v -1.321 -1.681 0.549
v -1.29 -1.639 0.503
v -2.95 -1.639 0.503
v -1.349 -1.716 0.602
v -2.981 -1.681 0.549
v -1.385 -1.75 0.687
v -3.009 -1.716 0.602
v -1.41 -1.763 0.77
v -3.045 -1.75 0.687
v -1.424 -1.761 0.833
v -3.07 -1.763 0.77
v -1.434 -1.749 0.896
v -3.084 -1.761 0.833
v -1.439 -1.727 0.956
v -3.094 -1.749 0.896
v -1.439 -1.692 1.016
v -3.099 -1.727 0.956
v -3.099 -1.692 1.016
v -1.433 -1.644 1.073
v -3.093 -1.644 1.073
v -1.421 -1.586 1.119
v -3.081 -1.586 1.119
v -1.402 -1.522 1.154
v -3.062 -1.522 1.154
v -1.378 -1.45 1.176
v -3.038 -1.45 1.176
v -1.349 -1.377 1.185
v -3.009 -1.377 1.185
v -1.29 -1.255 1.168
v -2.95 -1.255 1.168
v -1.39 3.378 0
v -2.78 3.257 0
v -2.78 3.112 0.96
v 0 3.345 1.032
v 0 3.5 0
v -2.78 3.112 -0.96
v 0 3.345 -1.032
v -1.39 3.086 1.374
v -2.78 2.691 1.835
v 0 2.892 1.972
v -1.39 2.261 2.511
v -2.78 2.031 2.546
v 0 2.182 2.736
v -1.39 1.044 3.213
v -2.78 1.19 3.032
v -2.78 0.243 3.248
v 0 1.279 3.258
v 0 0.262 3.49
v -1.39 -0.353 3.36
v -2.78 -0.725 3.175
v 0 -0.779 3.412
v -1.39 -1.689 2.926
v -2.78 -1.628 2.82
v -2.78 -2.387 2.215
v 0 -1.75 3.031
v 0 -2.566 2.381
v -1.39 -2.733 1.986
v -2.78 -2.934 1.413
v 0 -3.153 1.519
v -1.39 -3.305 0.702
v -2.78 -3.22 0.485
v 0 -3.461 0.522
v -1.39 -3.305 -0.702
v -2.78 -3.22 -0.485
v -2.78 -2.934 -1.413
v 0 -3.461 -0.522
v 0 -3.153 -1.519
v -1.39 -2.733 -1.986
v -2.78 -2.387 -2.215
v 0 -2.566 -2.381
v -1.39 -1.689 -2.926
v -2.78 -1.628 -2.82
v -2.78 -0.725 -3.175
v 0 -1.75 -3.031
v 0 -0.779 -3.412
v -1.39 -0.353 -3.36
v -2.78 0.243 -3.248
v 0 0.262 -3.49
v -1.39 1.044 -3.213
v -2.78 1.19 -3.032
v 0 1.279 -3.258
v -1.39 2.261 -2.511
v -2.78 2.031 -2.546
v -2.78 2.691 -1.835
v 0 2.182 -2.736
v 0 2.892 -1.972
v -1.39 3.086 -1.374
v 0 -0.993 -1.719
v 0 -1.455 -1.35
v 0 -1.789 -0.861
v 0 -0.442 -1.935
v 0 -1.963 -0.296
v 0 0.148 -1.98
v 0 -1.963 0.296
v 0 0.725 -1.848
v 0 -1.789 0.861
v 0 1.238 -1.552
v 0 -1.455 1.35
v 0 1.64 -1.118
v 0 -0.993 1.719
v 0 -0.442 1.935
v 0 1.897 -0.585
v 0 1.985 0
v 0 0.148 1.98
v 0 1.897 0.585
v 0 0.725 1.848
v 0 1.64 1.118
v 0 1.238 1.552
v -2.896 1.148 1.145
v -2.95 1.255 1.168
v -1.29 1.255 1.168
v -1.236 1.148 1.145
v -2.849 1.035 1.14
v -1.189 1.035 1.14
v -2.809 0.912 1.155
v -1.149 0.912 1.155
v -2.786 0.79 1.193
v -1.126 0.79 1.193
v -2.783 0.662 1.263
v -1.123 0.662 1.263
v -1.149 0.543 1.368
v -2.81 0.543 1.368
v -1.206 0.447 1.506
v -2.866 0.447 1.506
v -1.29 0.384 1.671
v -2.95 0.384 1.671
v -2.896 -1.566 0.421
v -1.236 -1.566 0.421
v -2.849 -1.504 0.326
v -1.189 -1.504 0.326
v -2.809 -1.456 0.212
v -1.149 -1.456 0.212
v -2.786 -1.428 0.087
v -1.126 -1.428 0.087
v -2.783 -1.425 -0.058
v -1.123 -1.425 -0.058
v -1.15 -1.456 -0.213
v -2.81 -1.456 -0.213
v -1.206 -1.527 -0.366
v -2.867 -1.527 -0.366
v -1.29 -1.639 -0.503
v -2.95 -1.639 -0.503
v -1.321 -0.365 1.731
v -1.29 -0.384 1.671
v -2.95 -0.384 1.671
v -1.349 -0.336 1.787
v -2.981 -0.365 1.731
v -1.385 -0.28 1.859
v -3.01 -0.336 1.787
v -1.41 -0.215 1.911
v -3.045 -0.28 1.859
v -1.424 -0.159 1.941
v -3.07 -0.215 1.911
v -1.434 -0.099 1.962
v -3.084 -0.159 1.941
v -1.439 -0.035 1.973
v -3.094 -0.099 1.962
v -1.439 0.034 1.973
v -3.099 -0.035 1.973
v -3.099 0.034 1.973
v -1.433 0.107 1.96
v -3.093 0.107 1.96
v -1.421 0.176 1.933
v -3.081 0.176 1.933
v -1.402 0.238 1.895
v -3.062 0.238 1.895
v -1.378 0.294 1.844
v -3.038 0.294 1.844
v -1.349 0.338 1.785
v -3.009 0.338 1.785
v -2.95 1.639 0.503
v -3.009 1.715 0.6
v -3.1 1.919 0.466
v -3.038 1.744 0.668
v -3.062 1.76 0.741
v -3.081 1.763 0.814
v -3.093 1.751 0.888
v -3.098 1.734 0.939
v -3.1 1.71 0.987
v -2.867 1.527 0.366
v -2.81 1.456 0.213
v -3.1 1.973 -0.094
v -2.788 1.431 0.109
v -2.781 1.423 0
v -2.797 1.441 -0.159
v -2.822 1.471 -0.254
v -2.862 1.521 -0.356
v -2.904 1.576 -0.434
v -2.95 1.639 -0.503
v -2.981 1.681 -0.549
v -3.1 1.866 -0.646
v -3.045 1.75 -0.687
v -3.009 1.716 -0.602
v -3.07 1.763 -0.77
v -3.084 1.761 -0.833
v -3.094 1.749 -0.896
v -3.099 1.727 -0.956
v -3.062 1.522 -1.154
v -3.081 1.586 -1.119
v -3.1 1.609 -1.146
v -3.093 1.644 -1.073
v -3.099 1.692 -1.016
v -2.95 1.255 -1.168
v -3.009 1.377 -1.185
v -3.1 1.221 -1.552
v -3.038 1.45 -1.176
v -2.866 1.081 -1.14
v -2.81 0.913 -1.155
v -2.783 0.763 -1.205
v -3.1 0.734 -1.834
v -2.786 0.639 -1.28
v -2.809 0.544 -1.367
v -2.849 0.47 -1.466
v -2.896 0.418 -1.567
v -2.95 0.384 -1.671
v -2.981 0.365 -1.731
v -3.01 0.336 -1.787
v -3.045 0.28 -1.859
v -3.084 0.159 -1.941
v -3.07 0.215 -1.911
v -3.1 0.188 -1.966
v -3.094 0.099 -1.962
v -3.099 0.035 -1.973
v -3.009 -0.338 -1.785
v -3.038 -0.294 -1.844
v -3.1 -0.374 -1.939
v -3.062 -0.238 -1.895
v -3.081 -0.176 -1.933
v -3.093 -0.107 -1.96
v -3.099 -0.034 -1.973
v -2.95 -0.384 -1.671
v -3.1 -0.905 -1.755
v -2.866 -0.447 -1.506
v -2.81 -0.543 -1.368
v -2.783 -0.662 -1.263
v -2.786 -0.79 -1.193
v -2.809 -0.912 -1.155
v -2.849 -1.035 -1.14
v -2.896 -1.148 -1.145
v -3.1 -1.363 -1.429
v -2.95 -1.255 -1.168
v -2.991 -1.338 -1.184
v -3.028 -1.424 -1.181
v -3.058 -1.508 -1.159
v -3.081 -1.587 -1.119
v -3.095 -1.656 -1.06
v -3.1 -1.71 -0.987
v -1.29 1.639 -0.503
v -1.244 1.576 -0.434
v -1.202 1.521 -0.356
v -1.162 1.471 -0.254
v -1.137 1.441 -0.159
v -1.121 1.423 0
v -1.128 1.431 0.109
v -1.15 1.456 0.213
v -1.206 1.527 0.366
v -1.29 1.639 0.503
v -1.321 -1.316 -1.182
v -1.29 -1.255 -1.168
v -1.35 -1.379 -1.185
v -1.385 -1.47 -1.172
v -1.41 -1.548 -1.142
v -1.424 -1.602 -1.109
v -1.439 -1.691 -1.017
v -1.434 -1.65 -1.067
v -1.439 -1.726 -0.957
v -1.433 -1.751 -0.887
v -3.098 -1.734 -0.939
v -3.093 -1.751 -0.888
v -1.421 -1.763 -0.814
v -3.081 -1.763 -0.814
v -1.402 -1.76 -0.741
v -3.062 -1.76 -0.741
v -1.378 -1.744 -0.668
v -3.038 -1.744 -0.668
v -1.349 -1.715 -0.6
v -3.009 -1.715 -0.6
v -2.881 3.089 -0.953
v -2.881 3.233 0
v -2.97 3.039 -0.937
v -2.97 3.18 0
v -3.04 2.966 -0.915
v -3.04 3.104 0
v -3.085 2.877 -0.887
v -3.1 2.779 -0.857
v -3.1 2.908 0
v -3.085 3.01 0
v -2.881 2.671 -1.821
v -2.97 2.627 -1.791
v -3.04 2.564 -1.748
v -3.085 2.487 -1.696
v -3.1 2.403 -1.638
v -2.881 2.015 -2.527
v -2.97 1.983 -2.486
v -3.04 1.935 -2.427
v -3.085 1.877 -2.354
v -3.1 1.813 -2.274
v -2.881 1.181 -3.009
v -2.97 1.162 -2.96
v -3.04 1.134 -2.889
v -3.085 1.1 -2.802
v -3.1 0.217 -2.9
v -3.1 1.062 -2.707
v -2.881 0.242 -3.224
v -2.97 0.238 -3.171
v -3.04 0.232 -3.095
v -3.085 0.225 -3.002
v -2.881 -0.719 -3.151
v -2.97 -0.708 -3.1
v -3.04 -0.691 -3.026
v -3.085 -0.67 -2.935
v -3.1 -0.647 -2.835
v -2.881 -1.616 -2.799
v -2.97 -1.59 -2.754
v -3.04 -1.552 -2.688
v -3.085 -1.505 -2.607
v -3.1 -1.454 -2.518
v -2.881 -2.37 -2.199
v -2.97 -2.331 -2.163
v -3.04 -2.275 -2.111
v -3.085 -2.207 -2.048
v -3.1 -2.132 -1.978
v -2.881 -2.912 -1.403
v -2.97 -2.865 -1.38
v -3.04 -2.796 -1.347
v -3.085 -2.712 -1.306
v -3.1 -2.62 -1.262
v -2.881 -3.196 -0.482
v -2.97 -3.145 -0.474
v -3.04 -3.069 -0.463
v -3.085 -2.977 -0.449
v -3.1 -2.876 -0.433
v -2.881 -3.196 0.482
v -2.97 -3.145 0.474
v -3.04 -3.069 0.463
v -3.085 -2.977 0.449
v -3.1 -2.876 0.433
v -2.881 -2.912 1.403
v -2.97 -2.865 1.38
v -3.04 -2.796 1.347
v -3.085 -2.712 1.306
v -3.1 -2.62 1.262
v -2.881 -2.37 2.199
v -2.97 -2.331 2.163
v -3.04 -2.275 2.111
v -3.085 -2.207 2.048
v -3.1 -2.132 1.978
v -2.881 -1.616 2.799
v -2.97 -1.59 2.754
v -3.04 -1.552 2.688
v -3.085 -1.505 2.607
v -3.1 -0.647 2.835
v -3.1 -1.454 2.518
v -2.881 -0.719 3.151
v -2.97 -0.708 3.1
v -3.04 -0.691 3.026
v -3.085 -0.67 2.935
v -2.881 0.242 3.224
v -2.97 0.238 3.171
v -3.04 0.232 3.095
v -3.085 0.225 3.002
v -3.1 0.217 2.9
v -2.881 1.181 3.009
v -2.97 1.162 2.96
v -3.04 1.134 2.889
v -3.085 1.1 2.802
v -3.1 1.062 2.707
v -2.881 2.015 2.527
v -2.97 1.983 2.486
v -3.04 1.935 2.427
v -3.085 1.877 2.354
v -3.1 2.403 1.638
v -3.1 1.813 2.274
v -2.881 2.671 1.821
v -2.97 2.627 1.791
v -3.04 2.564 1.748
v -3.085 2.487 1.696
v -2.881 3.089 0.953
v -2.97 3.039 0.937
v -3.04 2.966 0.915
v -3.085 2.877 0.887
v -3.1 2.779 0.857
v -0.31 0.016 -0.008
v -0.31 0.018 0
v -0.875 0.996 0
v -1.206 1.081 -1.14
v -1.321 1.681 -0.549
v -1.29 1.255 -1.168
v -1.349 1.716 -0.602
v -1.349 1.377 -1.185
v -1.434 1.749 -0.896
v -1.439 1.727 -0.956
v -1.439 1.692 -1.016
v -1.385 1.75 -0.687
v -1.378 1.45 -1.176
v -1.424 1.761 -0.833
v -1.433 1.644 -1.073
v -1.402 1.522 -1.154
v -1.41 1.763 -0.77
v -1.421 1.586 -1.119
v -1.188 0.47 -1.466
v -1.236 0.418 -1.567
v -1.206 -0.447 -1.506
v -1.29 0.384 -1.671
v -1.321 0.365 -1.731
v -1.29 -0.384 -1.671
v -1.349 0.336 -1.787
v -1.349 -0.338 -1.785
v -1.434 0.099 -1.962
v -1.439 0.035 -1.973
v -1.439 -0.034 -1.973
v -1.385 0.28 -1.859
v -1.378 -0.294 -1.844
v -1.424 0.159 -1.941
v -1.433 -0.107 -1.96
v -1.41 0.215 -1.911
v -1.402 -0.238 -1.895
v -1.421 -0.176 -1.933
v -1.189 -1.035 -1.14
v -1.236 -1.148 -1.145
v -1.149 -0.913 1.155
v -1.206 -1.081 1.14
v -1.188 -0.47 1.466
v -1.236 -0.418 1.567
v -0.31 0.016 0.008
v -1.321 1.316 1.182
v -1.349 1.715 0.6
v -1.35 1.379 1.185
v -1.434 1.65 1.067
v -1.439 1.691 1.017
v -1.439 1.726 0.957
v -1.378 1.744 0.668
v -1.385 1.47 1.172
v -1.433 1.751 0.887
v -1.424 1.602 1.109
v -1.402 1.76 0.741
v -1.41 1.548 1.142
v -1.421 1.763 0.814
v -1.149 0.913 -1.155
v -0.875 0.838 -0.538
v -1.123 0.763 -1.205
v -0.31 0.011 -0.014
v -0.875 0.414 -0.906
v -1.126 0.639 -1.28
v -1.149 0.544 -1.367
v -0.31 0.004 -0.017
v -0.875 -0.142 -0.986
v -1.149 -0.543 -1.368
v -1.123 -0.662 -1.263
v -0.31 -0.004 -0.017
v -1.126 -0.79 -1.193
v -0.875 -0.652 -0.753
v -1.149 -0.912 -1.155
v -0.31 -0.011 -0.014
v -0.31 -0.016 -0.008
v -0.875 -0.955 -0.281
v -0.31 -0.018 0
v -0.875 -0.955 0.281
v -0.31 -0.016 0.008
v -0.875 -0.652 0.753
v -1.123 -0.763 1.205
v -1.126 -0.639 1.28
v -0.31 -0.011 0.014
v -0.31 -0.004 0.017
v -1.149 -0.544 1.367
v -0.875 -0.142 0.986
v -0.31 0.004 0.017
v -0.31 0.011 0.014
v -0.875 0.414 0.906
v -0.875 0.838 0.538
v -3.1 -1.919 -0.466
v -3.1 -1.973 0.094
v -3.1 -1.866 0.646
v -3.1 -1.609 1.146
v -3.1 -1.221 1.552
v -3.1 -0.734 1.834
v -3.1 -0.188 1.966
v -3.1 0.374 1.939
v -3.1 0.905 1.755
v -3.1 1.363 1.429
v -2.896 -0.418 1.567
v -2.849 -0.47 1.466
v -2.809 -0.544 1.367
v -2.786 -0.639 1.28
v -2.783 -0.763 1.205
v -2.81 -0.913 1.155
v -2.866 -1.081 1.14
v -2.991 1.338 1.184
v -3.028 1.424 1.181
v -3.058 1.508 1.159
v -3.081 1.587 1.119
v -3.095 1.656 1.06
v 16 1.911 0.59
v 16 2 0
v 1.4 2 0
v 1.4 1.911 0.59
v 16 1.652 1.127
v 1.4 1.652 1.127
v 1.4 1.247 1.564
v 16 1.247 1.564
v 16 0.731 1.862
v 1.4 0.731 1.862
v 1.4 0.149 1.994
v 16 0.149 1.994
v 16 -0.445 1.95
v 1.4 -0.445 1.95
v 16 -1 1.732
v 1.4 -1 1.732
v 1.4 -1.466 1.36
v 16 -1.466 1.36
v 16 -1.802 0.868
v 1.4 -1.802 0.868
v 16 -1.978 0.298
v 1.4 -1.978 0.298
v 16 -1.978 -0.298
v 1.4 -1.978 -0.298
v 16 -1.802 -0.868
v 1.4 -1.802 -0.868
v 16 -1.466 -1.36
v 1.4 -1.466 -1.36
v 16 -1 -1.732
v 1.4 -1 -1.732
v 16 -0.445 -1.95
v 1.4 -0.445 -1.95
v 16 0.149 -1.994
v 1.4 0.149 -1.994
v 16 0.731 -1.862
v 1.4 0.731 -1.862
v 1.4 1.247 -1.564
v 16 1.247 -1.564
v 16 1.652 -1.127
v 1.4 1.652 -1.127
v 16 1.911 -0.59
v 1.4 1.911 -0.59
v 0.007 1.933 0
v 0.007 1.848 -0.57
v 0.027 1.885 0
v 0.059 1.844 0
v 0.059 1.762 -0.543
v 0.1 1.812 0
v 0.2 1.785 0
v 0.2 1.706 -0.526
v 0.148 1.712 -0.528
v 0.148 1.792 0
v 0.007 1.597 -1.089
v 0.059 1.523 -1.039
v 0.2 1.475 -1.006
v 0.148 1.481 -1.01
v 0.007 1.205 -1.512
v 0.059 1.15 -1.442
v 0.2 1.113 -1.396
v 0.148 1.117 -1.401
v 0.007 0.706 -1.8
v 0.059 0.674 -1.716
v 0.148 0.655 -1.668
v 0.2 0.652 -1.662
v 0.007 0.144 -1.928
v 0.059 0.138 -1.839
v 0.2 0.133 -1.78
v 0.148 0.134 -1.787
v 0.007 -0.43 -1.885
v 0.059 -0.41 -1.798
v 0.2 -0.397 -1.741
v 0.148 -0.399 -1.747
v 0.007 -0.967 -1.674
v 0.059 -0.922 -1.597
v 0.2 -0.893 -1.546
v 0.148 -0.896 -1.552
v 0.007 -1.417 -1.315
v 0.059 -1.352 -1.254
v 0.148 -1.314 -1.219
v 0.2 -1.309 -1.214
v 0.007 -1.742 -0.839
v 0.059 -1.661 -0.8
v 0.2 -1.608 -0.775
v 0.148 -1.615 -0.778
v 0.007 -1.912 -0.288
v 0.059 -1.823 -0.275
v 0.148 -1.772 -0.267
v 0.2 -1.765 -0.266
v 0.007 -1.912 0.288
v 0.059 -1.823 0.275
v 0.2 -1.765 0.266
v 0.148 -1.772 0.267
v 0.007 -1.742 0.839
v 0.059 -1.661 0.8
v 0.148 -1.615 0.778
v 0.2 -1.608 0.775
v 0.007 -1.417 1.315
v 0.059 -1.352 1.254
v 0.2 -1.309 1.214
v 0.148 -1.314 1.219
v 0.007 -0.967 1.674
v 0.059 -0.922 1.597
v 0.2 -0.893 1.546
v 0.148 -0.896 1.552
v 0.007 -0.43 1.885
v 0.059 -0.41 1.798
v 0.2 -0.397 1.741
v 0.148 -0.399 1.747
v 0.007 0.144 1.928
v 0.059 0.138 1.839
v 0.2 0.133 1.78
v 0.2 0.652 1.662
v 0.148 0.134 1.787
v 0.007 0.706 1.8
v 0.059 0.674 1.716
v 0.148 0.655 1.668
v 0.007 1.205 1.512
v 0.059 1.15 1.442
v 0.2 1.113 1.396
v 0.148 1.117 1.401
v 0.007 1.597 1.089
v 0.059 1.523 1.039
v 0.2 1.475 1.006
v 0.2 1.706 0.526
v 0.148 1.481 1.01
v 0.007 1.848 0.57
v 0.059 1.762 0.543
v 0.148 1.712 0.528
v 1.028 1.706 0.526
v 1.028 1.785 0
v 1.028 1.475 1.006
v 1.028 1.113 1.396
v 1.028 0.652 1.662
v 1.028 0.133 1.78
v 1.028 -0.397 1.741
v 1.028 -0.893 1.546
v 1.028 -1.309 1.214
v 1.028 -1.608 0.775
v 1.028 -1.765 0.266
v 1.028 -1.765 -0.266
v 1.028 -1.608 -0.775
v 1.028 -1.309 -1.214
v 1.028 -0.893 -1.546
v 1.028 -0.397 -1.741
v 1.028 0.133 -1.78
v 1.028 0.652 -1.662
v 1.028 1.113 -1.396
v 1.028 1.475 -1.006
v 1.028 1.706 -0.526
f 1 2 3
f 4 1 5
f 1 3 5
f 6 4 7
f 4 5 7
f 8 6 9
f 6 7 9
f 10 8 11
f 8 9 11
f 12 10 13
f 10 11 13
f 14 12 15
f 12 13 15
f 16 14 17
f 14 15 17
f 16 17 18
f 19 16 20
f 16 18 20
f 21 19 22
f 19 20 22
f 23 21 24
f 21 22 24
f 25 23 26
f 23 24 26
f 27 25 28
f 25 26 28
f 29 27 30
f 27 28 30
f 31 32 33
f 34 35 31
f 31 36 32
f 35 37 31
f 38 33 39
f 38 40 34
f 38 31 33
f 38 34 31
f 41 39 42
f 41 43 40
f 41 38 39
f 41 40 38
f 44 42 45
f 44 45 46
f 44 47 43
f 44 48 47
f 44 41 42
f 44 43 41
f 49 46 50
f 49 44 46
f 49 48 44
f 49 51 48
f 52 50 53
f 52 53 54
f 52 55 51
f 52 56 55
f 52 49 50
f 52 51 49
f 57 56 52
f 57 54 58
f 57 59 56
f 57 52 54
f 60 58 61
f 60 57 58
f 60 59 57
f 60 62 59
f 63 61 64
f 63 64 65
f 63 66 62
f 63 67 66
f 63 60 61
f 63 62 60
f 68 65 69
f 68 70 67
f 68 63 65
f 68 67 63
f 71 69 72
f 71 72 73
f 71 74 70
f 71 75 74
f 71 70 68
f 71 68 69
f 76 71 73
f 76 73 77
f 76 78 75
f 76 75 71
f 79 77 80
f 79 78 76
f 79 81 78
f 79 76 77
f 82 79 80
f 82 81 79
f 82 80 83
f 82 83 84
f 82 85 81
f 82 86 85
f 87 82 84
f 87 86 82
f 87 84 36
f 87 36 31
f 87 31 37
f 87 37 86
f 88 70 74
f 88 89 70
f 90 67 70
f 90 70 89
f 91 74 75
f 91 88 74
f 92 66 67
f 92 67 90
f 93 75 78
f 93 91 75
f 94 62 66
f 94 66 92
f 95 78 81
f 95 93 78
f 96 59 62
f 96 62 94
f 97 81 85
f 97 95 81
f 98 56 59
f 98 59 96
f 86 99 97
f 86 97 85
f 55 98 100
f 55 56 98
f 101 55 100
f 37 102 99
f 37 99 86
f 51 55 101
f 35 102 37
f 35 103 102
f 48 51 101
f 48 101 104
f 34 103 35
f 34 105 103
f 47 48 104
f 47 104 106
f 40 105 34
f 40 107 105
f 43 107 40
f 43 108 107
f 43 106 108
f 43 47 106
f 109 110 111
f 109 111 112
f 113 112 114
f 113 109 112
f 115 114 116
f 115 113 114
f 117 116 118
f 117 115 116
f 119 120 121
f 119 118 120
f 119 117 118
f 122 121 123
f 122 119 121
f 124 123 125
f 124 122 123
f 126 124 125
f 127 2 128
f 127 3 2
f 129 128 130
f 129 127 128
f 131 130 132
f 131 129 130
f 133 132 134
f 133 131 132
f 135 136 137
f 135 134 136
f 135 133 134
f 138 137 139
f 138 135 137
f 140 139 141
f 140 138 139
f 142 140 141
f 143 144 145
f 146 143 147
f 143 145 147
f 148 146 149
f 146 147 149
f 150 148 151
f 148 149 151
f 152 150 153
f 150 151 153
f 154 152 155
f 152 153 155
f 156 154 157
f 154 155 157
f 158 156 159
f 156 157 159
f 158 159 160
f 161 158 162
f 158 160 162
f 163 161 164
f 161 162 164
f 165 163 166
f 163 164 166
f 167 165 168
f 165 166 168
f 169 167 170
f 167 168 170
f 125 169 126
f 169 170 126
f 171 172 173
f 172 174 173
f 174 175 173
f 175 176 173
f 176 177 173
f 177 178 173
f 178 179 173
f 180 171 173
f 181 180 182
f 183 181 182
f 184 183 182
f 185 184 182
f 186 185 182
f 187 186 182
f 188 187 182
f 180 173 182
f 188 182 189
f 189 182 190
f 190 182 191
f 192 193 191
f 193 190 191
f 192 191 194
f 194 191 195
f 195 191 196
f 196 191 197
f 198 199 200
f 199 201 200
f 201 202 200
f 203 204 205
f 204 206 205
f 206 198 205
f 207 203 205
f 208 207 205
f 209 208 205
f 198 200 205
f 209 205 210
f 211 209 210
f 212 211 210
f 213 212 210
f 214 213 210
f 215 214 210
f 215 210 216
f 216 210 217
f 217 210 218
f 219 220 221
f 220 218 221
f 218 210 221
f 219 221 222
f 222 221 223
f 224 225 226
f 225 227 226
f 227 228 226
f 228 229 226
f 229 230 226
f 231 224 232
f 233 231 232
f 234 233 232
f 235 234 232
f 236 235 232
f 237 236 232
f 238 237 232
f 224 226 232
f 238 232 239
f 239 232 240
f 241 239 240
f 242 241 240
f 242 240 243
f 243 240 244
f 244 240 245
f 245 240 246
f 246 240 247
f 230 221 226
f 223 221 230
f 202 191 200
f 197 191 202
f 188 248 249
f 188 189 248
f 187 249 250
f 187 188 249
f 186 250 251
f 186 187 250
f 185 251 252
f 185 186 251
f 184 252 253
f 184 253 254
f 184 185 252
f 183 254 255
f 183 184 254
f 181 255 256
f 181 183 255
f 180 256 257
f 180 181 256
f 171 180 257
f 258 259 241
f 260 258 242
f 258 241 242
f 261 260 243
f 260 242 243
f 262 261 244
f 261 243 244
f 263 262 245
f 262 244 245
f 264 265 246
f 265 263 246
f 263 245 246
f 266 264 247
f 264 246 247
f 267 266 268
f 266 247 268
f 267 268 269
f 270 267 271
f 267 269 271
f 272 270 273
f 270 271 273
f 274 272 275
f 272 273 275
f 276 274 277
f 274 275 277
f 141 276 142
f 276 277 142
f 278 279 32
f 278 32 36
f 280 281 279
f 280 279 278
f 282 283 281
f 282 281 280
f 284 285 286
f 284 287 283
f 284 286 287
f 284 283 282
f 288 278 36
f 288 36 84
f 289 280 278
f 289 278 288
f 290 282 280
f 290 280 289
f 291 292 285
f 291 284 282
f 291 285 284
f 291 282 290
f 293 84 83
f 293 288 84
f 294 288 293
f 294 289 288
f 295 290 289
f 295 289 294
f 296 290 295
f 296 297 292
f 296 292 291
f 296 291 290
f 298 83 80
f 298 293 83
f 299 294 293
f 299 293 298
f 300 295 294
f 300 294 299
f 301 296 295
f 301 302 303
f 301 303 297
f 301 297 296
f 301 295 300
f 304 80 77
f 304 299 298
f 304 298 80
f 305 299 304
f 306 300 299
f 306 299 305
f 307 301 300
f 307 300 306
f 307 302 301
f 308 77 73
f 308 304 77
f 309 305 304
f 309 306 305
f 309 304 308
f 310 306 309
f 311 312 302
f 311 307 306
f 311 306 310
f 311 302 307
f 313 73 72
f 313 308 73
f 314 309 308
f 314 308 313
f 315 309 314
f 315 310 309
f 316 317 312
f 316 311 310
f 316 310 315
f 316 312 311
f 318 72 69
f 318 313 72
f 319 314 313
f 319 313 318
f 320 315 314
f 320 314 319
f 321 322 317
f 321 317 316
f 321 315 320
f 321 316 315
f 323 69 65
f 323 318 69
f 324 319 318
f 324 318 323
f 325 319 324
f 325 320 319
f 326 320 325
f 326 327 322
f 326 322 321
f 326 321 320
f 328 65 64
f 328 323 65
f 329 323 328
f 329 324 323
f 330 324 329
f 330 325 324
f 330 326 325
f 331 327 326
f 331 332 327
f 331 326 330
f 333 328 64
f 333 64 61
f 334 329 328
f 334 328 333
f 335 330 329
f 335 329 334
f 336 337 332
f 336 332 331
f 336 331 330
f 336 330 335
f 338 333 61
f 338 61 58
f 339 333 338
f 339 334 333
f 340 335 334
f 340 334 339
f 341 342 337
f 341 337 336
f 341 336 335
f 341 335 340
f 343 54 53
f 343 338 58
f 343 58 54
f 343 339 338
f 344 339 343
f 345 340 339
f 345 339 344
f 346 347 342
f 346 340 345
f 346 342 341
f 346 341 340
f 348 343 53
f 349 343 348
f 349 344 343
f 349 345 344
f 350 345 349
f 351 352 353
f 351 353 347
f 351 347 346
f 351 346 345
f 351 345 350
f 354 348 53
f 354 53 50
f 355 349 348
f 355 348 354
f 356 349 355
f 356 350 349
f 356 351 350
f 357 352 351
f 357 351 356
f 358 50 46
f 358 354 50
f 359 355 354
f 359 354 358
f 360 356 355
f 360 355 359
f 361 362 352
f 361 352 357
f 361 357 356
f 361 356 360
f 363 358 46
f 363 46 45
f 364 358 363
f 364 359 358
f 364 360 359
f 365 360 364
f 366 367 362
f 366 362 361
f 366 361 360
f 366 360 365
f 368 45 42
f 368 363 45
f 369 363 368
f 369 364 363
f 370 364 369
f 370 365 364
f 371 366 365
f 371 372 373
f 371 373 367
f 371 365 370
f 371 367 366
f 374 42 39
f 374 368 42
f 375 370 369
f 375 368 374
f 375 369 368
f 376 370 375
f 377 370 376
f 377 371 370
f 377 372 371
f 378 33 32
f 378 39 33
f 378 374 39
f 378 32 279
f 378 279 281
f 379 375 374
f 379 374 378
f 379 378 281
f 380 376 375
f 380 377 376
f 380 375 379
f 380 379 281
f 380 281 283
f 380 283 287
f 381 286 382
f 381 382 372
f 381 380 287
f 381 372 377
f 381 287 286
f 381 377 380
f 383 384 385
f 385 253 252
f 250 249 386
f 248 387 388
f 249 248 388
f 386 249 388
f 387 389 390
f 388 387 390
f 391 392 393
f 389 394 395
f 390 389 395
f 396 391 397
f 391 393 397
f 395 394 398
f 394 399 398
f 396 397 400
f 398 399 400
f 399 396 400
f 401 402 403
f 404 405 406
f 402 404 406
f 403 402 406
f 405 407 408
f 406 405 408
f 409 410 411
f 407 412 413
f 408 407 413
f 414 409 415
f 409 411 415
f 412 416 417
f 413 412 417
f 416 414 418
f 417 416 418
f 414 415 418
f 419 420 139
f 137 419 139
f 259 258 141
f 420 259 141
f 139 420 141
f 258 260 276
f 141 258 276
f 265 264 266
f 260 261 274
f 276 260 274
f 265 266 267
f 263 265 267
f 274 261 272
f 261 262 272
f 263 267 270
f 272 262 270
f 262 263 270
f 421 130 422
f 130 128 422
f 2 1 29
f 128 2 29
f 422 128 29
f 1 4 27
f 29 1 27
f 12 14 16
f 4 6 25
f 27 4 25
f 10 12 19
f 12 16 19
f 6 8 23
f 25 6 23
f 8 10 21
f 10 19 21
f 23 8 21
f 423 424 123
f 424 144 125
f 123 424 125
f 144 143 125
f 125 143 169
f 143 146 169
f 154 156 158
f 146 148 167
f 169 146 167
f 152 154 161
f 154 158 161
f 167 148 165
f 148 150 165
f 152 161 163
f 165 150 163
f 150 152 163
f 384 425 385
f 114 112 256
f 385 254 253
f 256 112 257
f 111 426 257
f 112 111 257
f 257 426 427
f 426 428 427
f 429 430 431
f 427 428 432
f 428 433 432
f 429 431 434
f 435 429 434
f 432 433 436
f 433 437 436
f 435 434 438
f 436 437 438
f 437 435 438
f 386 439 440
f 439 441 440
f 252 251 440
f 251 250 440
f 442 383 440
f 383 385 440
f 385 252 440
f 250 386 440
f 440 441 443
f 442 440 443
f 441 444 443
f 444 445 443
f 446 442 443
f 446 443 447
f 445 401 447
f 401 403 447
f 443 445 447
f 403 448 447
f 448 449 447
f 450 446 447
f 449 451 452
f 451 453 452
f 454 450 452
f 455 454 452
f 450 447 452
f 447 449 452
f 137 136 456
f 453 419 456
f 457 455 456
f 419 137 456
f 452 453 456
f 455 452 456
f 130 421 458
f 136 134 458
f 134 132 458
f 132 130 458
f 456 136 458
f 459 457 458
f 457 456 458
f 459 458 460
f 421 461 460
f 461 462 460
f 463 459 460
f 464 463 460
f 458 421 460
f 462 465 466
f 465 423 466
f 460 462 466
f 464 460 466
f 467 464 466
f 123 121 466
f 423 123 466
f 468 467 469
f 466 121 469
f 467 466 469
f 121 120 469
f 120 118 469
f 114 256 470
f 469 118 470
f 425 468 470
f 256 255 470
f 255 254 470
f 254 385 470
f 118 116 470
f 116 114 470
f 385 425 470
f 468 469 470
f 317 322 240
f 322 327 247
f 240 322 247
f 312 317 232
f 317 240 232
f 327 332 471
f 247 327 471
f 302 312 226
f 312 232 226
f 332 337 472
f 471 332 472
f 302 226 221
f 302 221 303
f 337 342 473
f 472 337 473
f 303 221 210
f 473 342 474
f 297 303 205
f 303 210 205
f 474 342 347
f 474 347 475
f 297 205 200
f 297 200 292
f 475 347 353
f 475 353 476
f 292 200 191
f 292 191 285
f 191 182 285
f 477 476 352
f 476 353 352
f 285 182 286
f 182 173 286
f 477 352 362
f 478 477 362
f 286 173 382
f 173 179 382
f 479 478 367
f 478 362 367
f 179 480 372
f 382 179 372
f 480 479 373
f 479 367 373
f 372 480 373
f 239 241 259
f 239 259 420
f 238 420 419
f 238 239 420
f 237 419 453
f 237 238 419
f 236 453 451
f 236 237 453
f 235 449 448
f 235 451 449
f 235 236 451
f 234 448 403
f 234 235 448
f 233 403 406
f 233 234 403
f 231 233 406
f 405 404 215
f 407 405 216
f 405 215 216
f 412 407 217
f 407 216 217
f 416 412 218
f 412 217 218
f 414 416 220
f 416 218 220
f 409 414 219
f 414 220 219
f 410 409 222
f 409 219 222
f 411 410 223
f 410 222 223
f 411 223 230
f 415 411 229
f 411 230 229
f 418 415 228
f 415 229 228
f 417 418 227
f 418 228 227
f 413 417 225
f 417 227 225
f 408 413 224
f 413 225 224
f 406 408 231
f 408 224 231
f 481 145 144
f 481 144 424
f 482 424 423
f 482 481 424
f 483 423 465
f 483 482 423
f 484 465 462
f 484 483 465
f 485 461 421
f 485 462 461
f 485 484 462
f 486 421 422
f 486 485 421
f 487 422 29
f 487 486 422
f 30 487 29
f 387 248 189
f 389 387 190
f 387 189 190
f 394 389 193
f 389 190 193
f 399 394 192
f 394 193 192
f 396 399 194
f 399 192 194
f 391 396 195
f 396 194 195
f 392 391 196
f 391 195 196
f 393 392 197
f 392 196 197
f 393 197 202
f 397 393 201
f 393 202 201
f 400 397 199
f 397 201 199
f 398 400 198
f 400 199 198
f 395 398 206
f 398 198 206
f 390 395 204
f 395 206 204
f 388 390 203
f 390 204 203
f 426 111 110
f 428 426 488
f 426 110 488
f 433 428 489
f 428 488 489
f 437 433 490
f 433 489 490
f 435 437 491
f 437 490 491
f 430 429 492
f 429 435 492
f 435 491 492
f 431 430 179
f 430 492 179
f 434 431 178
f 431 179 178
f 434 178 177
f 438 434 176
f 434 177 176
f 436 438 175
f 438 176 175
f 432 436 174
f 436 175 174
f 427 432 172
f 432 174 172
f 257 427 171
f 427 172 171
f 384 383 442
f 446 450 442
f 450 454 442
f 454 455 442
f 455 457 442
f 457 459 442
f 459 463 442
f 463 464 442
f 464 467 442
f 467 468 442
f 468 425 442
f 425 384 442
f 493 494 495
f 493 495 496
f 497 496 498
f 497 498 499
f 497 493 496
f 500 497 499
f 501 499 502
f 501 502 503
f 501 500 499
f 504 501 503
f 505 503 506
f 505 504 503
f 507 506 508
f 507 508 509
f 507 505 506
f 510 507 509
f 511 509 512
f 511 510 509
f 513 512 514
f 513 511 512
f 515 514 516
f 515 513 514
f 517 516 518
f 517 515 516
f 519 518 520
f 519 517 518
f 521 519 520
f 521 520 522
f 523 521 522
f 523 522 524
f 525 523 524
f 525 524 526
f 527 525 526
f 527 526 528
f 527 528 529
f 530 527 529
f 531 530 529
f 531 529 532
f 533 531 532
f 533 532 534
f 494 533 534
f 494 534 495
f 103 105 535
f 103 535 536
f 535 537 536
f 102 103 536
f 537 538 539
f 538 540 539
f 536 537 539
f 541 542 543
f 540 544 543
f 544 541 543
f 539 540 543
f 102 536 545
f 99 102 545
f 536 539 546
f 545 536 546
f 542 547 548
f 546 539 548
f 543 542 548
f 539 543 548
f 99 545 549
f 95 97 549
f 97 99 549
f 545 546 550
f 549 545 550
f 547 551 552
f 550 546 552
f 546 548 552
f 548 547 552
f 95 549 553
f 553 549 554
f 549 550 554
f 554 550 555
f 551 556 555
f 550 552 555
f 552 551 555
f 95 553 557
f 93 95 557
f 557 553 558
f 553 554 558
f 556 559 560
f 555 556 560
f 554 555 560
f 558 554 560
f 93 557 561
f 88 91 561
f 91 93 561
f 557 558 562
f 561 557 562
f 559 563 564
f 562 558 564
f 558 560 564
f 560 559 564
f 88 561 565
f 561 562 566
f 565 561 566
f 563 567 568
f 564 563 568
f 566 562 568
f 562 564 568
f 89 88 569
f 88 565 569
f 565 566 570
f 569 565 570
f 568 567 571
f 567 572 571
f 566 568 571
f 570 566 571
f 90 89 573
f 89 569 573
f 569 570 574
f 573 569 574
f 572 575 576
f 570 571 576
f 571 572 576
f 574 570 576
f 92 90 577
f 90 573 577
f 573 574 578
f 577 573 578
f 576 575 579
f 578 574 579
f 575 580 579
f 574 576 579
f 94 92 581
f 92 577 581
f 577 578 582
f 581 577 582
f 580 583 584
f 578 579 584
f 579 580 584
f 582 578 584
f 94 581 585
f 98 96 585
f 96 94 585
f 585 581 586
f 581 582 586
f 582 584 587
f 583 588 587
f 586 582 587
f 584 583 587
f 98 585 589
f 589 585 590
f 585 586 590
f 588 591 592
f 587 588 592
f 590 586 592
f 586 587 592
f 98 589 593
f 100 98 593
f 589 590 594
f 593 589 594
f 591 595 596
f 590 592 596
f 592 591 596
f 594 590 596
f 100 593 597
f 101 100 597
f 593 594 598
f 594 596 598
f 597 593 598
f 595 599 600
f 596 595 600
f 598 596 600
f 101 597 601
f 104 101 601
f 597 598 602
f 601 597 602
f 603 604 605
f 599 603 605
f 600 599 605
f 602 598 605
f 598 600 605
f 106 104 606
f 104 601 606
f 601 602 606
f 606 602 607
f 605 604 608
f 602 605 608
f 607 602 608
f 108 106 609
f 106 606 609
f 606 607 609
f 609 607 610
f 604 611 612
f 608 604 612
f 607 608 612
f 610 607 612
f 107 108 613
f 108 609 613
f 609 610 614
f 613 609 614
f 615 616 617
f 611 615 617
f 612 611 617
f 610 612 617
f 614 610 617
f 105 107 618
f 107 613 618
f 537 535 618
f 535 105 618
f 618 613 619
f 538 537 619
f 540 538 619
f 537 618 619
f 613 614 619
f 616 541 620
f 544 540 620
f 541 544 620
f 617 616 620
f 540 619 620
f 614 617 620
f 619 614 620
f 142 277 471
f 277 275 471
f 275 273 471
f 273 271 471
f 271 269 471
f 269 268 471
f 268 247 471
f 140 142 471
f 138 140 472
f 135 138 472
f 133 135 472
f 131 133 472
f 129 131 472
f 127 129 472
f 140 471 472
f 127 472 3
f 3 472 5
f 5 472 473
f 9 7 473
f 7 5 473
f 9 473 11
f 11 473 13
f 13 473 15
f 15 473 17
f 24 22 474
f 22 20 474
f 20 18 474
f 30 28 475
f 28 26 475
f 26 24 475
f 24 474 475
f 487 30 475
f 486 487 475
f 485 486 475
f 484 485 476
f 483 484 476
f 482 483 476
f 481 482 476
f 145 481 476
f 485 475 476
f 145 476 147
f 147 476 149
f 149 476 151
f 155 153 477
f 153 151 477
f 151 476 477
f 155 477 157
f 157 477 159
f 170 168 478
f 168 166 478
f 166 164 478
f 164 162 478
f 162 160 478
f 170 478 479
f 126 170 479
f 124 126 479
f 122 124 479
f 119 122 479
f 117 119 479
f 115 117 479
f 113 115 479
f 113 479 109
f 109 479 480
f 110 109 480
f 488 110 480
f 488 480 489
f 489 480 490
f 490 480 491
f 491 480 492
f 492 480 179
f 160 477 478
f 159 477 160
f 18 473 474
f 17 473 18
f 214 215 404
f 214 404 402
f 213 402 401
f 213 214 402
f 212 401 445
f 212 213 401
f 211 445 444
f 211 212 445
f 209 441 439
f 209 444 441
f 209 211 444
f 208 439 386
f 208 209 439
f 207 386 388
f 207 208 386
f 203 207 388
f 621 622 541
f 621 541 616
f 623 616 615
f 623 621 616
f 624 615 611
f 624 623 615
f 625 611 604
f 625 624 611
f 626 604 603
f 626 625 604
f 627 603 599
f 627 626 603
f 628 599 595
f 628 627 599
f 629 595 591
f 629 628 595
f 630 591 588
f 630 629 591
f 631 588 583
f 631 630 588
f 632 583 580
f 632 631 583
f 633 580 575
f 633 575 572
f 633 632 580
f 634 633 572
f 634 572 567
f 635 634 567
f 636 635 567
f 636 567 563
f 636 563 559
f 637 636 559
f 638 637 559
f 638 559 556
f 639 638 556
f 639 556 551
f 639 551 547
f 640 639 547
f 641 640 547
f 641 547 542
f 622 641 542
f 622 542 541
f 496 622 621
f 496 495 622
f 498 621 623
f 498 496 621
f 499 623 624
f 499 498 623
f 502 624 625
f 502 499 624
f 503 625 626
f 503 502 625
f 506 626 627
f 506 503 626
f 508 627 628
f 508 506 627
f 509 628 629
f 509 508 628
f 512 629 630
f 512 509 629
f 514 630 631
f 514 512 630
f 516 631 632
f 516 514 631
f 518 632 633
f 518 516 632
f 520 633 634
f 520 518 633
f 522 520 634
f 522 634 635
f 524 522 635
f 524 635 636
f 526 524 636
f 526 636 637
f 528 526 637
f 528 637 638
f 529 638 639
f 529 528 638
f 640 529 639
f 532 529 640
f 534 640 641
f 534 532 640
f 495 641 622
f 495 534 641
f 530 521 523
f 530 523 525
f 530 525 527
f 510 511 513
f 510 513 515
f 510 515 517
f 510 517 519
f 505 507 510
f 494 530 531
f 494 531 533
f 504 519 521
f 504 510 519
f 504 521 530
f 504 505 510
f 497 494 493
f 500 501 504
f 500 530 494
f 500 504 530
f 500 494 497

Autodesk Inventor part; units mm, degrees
sketch "Skizze_2" plane through (-3.1, 0, 0) normal (1, 0, 0) x (0, 0, -1)
  arc A0 (-1.6711, 0.3843) -> (-1.6711, -0.3843) centre (-1.58, 0) ccw
  arc A1 (-1.1684, -1.2551) -> (-1.6711, -0.3843) centre (-1.8307, -1.0569) ccw
  arc A2 (-1.1684, -1.2551) -> (-0.5027, -1.6394) centre (-0.79, -1.3683) ccw
  arc A3 (0.5027, -1.6394) -> (-0.5027, -1.6394) centre (0, -2.1139) ccw
  arc A4 (0.5027, -1.6394) -> (1.1684, -1.2551) centre (0.79, -1.3683) ccw
  arc A5 (1.6711, -0.3843) -> (1.1684, -1.2551) centre (1.8307, -1.0569) ccw
  arc A6 (1.6711, -0.3843) -> (1.6711, 0.3843) centre (1.58, 0) ccw
  arc A7 (1.1684, 1.2551) -> (1.6711, 0.3843) centre (1.8307, 1.0569) ccw
  arc A8 (1.1684, 1.2551) -> (0.5027, 1.6394) centre (0.79, 1.3683) ccw
  arc A9 (-0.5027, 1.6394) -> (0.5027, 1.6394) centre (0, 2.1139) ccw
  arc A10 (-0.5027, 1.6394) -> (-1.1684, 1.2551) centre (-0.79, 1.3683) ccw
  arc A11 (-1.6711, 0.3843) -> (-1.1684, 1.2551) centre (-1.8307, 1.0569) ccw
sketch "Skizze_3" plane through (0, 0, 0) normal (0, 0, 1) x (1, 0, 0)
  line L0 (-0.1, 0) -> (-0.2997, 0)
  line L1 (-0.2997, 0) -> (-1.4977, 2.075)
  line L2 (-1.4977, 2.075) -> (-0.1, 2.075)
  line L3 (-0.1, 2.075) -> (-0.1, 0)
  line L4 (-0.1, 0) -> (-0.2997, 0)
sketch "Skizze_5" plane through (0, 0, 0) normal (0, 0, 1) x (1, 0, 0)
  line L0 (16, 0) -> (-3.1, 0)
  line L1 (-3.1, 0) -> (-3.1, 3.2288)
  line L2 (-3.1, 3.2288) -> (0, 3.5)
  line L3 (0, 3.5) -> (0, 1.7853)
  line L4 (0, 1.7853) -> (1.028, 1.7853)
  line L5 (1.028, 1.7853) -> (1.4, 2)
  line L6 (1.4, 2) -> (16, 2)
  line L7 (16, 2) -> (16, 0)
  line L8 (16, 0) -> (-3.1, 0)
revolve "Revolution1" add sketch "Skizze_5" angle 360 about axis through (16, 0, 0) along (1, 0, 0)
thread "Thread1" size "M4x0.7" class "6g" standard "ISO Metric profile" full length
sketch "Sketch_1" plane through (0, 0, 0) normal (0, 0, 1) x (1, 0, 0)
  line L0 (0.2, 0) -> (-0.1, 0)
  line L1 (-0.1, 1.6853) -> (0.2, 1.6853)
  line L2 (0.2, 1.6853) -> (0.2, 1.7853)
  arc A0 (0, 1.9852) -> (0.2, 1.7853) centre (0.2, 1.9853) ccw
  line L3 (0, 1.9852) -> (-0.1, 1.9852)
  line L4 (-0.1, 1.9852) -> (-0.1, 1.6853)
revolve "Revolution2" add sketch "Sketch_1" angle 360 about axis through (0.2, 0, 0) along (1, 0, 0)
sketch "Sketch_2" plane through (0, 0, 0) normal (0, 0, 1) x (1, 0, 0)
  line L0 (-1.9597, 0) -> (-3.1, 0)
  line L1 (-3.1, 0) -> (-3.1, 1.975)
  line L2 (-3.1, 1.975) -> (-1.9597, 0)
  line L3 (-1.9597, 0) -> (-3.1, 0)
revolve "Revolution3" cut sketch "Sketch_2" angle 360 about axis through (-1.9597, 0, 0) along (1, 0, 0)
sketch "Sketch_3" plane through (0, 0, 0) normal (0, 0, 1) x (1, 0, 0)
  line L0 (50, 0) -> (-3.1, 0)
  line L1 (-3.6, 8.4) -> (-3.6, 2.9081)
  line L2 (-3.6, 2.9081) -> (-3.1, 2.9081)
  arc A0 (-2.7805, 3.2567) -> (-3.1, 2.9081) centre (-2.75, 2.9081) ccw
  line L3 (-2.7805, 3.2567) -> (-2.7805, 8.4)
  line L4 (-2.7805, 8.4) -> (-3.6, 8.4)
revolve "Revolution4" cut sketch "Sketch_3" angle 360 about axis through (50, 0, 0) along (1, 0, 0)
extrude "Extrusion1" cut sketch "Skizze_2" along normal blind 2.79
revolve "Revolution5" add sketch "Skizze_3" angle 360 about axis through (-0.1, 0, 0) along (1, 0, 0)
ref_plane "IP1_XY" through (0, 0, 0) normal (1, 0, 0) x (0, 0, -1)
ref_plane "IP1_YZ" through (0, 0, 0) normal (0, 0, -1) x (0, 1, 0)
ref_plane "IP1_ZX" through (0, 0, 0) normal (0, 1, 0) x (1, 0, 0)
properties part number "ISO 14580 M4x16"
